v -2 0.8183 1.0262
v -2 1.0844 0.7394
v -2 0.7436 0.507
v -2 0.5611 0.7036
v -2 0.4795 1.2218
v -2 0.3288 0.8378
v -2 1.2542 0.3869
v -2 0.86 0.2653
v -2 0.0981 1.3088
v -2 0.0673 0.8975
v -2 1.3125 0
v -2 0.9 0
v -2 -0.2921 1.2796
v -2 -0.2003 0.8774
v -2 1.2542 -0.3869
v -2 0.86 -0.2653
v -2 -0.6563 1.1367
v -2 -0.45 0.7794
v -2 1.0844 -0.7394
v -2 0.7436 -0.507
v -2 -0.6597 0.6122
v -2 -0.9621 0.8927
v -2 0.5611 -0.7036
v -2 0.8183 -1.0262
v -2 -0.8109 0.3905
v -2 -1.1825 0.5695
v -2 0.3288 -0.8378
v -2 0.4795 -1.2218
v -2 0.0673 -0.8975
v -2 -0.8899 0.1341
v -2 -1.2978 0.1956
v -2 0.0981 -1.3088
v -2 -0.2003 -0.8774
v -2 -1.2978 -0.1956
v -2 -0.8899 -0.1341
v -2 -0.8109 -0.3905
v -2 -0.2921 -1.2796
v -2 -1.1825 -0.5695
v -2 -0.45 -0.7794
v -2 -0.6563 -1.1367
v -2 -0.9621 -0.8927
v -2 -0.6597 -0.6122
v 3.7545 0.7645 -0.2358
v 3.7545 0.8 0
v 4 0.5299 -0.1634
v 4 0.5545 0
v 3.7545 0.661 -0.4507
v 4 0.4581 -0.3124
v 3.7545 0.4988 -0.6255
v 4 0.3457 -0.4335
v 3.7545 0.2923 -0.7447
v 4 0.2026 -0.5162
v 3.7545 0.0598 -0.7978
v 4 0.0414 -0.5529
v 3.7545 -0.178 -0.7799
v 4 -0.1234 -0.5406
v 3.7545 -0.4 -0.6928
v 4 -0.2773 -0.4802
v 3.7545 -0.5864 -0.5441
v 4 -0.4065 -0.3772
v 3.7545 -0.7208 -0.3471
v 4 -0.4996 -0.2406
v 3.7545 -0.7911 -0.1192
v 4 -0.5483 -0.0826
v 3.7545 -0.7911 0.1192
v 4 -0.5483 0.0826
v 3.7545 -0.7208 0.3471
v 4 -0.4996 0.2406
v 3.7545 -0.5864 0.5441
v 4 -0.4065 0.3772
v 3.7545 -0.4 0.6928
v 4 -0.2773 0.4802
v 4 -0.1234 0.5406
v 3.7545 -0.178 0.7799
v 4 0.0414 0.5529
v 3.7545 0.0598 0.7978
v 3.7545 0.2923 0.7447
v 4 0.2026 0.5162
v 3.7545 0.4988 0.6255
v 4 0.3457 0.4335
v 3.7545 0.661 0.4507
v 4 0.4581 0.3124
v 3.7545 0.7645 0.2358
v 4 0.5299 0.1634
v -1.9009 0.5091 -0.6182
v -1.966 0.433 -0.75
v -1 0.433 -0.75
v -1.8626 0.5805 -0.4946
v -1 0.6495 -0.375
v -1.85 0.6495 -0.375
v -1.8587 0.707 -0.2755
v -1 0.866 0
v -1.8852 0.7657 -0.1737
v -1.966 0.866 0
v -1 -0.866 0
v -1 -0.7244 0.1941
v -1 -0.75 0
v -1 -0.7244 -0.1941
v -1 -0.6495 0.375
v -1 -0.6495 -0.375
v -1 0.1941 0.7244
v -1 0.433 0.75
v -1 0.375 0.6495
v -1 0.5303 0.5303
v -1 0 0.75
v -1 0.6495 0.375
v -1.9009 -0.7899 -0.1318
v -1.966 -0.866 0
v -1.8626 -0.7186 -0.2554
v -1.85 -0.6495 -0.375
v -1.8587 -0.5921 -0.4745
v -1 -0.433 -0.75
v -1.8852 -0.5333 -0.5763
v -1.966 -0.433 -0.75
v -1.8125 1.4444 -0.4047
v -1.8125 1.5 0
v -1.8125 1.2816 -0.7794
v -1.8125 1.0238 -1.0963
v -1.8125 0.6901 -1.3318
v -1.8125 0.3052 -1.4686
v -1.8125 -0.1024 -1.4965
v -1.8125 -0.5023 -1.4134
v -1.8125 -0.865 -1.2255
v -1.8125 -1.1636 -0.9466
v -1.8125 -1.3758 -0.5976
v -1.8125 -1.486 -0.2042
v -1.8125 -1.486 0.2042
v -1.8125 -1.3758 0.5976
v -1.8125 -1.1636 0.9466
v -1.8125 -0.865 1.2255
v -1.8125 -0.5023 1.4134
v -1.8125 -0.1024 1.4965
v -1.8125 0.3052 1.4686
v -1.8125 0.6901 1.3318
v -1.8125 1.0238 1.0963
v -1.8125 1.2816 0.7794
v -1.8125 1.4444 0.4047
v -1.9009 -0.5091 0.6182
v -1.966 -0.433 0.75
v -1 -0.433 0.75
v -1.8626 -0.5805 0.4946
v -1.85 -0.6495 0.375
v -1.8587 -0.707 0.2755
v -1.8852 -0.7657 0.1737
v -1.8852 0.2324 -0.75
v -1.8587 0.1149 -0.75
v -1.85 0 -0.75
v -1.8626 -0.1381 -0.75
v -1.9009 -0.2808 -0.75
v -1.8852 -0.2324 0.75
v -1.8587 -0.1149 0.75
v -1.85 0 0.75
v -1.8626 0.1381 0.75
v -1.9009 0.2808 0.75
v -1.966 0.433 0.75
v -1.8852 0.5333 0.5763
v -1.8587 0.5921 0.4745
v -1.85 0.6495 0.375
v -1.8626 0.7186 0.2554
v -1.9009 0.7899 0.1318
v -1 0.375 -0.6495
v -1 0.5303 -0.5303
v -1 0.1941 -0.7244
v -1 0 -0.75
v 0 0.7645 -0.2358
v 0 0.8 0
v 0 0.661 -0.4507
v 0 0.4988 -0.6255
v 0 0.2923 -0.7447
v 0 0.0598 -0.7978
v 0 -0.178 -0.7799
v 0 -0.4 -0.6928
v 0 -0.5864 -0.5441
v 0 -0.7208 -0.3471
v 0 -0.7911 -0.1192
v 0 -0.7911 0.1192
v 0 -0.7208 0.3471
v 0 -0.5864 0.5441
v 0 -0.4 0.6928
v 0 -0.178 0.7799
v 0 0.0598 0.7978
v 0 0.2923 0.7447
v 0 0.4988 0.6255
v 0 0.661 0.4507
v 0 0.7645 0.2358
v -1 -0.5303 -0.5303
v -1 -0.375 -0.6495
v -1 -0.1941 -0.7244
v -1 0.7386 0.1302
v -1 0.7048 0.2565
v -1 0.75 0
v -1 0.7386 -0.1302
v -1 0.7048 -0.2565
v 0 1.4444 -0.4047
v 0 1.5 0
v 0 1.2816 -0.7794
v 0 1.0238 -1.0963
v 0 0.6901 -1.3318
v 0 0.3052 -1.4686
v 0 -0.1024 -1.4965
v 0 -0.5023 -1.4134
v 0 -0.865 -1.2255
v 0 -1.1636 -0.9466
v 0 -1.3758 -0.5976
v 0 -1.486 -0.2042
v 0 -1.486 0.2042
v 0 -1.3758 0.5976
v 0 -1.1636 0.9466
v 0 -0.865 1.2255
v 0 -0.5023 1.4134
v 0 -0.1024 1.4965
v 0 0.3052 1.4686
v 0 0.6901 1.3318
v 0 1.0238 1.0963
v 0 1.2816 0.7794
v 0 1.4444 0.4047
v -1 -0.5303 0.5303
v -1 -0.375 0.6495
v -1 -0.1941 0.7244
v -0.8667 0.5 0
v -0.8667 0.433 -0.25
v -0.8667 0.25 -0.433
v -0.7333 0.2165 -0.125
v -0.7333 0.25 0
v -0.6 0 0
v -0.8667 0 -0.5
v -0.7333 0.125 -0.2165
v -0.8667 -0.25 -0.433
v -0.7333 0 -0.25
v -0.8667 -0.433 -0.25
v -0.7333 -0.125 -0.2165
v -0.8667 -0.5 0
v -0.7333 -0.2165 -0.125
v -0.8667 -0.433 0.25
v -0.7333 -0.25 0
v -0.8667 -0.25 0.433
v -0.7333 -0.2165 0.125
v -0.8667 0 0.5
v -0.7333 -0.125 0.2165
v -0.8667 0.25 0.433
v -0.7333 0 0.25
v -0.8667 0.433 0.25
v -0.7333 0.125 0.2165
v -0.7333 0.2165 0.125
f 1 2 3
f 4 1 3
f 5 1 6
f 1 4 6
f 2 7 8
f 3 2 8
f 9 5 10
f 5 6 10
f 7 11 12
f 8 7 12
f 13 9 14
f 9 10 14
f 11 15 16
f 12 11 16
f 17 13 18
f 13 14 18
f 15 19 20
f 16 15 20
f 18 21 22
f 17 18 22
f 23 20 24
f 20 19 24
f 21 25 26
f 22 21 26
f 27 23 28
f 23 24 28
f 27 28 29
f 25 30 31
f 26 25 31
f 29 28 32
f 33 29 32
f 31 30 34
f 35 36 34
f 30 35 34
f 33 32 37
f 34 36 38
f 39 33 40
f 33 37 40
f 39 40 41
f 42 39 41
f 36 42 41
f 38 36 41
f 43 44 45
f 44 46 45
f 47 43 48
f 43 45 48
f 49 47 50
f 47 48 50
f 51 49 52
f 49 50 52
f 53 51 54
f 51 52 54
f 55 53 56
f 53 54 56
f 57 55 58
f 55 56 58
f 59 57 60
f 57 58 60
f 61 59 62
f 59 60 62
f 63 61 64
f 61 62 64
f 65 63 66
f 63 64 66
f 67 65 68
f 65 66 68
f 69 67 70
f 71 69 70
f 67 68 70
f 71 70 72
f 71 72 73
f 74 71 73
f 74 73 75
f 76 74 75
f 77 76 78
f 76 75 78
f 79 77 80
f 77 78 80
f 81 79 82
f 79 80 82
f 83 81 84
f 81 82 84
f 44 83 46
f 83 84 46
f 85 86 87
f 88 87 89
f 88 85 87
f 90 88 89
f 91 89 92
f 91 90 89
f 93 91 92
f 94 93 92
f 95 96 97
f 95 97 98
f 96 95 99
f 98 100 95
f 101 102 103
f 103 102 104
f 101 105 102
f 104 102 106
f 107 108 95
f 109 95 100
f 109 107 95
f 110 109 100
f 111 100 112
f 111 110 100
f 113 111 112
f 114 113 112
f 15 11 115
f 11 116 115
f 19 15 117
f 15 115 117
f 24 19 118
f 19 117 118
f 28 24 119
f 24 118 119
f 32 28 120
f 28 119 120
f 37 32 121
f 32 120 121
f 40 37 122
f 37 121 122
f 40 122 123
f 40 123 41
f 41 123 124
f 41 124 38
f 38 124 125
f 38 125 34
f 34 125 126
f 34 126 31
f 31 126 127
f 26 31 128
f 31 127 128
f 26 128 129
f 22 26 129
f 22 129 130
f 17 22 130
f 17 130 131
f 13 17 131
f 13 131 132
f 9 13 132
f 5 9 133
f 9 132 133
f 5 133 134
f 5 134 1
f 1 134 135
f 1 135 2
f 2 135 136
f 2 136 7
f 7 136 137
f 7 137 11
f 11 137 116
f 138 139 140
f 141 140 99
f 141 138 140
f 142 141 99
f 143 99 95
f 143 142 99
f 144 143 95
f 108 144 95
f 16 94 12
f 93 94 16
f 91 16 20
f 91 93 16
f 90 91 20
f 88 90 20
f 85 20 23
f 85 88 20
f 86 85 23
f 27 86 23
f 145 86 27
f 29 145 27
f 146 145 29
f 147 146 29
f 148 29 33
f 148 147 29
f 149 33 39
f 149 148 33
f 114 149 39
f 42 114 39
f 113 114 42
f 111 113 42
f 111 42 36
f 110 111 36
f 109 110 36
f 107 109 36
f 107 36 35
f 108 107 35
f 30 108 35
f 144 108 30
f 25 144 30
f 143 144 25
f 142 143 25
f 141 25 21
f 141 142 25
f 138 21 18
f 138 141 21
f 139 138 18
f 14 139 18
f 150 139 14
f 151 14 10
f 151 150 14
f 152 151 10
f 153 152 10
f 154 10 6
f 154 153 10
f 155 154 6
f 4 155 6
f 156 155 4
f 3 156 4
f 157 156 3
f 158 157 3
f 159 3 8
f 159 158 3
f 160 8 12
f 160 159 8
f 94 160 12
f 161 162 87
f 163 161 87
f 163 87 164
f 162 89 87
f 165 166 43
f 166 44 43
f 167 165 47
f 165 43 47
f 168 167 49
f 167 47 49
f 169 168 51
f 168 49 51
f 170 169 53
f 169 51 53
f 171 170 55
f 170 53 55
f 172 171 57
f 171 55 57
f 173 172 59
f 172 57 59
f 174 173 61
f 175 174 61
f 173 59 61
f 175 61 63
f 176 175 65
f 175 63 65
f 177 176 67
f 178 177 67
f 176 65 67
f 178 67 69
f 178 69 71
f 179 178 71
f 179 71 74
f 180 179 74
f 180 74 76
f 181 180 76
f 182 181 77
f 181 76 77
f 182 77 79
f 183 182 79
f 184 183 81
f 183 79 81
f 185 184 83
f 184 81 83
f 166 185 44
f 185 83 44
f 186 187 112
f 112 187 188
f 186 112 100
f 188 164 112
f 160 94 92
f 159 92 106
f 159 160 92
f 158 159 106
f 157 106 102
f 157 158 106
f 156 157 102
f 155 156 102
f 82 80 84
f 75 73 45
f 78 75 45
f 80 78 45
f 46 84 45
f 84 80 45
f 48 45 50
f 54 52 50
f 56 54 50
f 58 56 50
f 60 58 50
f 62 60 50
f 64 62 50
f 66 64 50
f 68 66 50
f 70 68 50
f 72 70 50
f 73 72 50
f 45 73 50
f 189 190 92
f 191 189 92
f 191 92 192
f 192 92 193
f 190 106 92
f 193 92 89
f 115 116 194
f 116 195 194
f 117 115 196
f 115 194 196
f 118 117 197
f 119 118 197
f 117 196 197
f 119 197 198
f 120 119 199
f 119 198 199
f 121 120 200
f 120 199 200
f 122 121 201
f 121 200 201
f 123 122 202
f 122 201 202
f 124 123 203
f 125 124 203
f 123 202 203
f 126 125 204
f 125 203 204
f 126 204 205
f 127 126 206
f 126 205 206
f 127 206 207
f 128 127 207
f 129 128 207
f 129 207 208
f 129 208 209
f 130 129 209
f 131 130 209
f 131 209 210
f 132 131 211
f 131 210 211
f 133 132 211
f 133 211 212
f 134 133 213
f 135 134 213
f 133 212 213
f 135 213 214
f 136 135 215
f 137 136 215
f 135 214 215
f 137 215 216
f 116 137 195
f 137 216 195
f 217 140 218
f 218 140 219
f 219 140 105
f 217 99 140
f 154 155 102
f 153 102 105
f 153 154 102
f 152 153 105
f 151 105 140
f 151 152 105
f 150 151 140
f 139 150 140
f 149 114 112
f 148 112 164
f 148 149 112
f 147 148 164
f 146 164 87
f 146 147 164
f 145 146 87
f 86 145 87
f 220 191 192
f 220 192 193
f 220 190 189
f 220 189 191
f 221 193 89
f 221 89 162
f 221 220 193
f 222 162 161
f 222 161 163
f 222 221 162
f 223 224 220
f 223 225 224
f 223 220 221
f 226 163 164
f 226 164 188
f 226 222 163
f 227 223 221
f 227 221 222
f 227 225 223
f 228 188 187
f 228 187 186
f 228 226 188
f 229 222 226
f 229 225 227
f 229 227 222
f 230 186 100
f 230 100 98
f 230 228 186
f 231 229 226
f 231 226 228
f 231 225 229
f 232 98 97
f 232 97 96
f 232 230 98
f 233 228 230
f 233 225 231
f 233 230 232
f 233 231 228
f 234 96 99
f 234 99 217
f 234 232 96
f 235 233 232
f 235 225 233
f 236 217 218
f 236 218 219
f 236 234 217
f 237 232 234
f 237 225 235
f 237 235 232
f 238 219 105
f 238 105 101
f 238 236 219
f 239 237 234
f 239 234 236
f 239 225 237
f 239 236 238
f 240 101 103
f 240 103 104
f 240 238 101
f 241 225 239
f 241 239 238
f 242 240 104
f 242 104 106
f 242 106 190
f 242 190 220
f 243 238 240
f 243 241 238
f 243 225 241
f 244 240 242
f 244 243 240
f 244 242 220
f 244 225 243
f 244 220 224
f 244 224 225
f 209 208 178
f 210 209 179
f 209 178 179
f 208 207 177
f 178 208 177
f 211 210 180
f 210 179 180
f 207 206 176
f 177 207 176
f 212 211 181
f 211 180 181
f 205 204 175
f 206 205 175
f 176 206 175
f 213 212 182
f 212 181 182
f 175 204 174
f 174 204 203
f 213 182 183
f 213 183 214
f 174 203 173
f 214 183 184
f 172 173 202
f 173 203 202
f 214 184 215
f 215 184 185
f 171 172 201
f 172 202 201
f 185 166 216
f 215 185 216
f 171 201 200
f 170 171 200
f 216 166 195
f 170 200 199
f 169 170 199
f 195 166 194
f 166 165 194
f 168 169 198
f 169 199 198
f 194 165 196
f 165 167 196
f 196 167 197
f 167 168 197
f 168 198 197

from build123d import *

# Parameters (mm, degrees)
CUT_EXTRUDE1_DEPTH = 1


with BuildPart() as part:
    # Sketch1 → Revolve1 (revolve)
    with BuildSketch(Plane.XY):
        Polygon((-2, 0), (-2, 1.3125), (-1.8125, 1.5), (0, 1.5), (0, 0.8), (3.7545, 0.8), (4, 0.5545), (4, 0), align=None)
    revolve(axis=Axis((4, 0, 0), (-1, 0, 0)))

    # Sketch2 → Cut-Revolve1 (revolve, cut)
    with BuildSketch(Plane.XY):
        Polygon((-2, 0), (-2, 0.9), (-1.85, 0.75), (-1, 0.75), (-0.6, 0), align=None)
    revolve(axis=Axis((-0.6, 0, 0), (-1, 0, 0)), mode=Mode.SUBTRACT)

    # Sketch3 → Cut-Extrude1 (cut)
    with BuildSketch(Plane(origin=(-2, 0, 0), x_dir=(0, 0, -1), z_dir=(1, 0, 0))):
        Polygon((-0.75, -0.433012702), (0, -0.866025404), (0.75, -0.433012702), (0.75, 0.433012702), (0, 0.866025404), (-0.75, 0.433012702), align=None)
    extrude(amount=CUT_EXTRUDE1_DEPTH, mode=Mode.SUBTRACT)


solid = part.part
